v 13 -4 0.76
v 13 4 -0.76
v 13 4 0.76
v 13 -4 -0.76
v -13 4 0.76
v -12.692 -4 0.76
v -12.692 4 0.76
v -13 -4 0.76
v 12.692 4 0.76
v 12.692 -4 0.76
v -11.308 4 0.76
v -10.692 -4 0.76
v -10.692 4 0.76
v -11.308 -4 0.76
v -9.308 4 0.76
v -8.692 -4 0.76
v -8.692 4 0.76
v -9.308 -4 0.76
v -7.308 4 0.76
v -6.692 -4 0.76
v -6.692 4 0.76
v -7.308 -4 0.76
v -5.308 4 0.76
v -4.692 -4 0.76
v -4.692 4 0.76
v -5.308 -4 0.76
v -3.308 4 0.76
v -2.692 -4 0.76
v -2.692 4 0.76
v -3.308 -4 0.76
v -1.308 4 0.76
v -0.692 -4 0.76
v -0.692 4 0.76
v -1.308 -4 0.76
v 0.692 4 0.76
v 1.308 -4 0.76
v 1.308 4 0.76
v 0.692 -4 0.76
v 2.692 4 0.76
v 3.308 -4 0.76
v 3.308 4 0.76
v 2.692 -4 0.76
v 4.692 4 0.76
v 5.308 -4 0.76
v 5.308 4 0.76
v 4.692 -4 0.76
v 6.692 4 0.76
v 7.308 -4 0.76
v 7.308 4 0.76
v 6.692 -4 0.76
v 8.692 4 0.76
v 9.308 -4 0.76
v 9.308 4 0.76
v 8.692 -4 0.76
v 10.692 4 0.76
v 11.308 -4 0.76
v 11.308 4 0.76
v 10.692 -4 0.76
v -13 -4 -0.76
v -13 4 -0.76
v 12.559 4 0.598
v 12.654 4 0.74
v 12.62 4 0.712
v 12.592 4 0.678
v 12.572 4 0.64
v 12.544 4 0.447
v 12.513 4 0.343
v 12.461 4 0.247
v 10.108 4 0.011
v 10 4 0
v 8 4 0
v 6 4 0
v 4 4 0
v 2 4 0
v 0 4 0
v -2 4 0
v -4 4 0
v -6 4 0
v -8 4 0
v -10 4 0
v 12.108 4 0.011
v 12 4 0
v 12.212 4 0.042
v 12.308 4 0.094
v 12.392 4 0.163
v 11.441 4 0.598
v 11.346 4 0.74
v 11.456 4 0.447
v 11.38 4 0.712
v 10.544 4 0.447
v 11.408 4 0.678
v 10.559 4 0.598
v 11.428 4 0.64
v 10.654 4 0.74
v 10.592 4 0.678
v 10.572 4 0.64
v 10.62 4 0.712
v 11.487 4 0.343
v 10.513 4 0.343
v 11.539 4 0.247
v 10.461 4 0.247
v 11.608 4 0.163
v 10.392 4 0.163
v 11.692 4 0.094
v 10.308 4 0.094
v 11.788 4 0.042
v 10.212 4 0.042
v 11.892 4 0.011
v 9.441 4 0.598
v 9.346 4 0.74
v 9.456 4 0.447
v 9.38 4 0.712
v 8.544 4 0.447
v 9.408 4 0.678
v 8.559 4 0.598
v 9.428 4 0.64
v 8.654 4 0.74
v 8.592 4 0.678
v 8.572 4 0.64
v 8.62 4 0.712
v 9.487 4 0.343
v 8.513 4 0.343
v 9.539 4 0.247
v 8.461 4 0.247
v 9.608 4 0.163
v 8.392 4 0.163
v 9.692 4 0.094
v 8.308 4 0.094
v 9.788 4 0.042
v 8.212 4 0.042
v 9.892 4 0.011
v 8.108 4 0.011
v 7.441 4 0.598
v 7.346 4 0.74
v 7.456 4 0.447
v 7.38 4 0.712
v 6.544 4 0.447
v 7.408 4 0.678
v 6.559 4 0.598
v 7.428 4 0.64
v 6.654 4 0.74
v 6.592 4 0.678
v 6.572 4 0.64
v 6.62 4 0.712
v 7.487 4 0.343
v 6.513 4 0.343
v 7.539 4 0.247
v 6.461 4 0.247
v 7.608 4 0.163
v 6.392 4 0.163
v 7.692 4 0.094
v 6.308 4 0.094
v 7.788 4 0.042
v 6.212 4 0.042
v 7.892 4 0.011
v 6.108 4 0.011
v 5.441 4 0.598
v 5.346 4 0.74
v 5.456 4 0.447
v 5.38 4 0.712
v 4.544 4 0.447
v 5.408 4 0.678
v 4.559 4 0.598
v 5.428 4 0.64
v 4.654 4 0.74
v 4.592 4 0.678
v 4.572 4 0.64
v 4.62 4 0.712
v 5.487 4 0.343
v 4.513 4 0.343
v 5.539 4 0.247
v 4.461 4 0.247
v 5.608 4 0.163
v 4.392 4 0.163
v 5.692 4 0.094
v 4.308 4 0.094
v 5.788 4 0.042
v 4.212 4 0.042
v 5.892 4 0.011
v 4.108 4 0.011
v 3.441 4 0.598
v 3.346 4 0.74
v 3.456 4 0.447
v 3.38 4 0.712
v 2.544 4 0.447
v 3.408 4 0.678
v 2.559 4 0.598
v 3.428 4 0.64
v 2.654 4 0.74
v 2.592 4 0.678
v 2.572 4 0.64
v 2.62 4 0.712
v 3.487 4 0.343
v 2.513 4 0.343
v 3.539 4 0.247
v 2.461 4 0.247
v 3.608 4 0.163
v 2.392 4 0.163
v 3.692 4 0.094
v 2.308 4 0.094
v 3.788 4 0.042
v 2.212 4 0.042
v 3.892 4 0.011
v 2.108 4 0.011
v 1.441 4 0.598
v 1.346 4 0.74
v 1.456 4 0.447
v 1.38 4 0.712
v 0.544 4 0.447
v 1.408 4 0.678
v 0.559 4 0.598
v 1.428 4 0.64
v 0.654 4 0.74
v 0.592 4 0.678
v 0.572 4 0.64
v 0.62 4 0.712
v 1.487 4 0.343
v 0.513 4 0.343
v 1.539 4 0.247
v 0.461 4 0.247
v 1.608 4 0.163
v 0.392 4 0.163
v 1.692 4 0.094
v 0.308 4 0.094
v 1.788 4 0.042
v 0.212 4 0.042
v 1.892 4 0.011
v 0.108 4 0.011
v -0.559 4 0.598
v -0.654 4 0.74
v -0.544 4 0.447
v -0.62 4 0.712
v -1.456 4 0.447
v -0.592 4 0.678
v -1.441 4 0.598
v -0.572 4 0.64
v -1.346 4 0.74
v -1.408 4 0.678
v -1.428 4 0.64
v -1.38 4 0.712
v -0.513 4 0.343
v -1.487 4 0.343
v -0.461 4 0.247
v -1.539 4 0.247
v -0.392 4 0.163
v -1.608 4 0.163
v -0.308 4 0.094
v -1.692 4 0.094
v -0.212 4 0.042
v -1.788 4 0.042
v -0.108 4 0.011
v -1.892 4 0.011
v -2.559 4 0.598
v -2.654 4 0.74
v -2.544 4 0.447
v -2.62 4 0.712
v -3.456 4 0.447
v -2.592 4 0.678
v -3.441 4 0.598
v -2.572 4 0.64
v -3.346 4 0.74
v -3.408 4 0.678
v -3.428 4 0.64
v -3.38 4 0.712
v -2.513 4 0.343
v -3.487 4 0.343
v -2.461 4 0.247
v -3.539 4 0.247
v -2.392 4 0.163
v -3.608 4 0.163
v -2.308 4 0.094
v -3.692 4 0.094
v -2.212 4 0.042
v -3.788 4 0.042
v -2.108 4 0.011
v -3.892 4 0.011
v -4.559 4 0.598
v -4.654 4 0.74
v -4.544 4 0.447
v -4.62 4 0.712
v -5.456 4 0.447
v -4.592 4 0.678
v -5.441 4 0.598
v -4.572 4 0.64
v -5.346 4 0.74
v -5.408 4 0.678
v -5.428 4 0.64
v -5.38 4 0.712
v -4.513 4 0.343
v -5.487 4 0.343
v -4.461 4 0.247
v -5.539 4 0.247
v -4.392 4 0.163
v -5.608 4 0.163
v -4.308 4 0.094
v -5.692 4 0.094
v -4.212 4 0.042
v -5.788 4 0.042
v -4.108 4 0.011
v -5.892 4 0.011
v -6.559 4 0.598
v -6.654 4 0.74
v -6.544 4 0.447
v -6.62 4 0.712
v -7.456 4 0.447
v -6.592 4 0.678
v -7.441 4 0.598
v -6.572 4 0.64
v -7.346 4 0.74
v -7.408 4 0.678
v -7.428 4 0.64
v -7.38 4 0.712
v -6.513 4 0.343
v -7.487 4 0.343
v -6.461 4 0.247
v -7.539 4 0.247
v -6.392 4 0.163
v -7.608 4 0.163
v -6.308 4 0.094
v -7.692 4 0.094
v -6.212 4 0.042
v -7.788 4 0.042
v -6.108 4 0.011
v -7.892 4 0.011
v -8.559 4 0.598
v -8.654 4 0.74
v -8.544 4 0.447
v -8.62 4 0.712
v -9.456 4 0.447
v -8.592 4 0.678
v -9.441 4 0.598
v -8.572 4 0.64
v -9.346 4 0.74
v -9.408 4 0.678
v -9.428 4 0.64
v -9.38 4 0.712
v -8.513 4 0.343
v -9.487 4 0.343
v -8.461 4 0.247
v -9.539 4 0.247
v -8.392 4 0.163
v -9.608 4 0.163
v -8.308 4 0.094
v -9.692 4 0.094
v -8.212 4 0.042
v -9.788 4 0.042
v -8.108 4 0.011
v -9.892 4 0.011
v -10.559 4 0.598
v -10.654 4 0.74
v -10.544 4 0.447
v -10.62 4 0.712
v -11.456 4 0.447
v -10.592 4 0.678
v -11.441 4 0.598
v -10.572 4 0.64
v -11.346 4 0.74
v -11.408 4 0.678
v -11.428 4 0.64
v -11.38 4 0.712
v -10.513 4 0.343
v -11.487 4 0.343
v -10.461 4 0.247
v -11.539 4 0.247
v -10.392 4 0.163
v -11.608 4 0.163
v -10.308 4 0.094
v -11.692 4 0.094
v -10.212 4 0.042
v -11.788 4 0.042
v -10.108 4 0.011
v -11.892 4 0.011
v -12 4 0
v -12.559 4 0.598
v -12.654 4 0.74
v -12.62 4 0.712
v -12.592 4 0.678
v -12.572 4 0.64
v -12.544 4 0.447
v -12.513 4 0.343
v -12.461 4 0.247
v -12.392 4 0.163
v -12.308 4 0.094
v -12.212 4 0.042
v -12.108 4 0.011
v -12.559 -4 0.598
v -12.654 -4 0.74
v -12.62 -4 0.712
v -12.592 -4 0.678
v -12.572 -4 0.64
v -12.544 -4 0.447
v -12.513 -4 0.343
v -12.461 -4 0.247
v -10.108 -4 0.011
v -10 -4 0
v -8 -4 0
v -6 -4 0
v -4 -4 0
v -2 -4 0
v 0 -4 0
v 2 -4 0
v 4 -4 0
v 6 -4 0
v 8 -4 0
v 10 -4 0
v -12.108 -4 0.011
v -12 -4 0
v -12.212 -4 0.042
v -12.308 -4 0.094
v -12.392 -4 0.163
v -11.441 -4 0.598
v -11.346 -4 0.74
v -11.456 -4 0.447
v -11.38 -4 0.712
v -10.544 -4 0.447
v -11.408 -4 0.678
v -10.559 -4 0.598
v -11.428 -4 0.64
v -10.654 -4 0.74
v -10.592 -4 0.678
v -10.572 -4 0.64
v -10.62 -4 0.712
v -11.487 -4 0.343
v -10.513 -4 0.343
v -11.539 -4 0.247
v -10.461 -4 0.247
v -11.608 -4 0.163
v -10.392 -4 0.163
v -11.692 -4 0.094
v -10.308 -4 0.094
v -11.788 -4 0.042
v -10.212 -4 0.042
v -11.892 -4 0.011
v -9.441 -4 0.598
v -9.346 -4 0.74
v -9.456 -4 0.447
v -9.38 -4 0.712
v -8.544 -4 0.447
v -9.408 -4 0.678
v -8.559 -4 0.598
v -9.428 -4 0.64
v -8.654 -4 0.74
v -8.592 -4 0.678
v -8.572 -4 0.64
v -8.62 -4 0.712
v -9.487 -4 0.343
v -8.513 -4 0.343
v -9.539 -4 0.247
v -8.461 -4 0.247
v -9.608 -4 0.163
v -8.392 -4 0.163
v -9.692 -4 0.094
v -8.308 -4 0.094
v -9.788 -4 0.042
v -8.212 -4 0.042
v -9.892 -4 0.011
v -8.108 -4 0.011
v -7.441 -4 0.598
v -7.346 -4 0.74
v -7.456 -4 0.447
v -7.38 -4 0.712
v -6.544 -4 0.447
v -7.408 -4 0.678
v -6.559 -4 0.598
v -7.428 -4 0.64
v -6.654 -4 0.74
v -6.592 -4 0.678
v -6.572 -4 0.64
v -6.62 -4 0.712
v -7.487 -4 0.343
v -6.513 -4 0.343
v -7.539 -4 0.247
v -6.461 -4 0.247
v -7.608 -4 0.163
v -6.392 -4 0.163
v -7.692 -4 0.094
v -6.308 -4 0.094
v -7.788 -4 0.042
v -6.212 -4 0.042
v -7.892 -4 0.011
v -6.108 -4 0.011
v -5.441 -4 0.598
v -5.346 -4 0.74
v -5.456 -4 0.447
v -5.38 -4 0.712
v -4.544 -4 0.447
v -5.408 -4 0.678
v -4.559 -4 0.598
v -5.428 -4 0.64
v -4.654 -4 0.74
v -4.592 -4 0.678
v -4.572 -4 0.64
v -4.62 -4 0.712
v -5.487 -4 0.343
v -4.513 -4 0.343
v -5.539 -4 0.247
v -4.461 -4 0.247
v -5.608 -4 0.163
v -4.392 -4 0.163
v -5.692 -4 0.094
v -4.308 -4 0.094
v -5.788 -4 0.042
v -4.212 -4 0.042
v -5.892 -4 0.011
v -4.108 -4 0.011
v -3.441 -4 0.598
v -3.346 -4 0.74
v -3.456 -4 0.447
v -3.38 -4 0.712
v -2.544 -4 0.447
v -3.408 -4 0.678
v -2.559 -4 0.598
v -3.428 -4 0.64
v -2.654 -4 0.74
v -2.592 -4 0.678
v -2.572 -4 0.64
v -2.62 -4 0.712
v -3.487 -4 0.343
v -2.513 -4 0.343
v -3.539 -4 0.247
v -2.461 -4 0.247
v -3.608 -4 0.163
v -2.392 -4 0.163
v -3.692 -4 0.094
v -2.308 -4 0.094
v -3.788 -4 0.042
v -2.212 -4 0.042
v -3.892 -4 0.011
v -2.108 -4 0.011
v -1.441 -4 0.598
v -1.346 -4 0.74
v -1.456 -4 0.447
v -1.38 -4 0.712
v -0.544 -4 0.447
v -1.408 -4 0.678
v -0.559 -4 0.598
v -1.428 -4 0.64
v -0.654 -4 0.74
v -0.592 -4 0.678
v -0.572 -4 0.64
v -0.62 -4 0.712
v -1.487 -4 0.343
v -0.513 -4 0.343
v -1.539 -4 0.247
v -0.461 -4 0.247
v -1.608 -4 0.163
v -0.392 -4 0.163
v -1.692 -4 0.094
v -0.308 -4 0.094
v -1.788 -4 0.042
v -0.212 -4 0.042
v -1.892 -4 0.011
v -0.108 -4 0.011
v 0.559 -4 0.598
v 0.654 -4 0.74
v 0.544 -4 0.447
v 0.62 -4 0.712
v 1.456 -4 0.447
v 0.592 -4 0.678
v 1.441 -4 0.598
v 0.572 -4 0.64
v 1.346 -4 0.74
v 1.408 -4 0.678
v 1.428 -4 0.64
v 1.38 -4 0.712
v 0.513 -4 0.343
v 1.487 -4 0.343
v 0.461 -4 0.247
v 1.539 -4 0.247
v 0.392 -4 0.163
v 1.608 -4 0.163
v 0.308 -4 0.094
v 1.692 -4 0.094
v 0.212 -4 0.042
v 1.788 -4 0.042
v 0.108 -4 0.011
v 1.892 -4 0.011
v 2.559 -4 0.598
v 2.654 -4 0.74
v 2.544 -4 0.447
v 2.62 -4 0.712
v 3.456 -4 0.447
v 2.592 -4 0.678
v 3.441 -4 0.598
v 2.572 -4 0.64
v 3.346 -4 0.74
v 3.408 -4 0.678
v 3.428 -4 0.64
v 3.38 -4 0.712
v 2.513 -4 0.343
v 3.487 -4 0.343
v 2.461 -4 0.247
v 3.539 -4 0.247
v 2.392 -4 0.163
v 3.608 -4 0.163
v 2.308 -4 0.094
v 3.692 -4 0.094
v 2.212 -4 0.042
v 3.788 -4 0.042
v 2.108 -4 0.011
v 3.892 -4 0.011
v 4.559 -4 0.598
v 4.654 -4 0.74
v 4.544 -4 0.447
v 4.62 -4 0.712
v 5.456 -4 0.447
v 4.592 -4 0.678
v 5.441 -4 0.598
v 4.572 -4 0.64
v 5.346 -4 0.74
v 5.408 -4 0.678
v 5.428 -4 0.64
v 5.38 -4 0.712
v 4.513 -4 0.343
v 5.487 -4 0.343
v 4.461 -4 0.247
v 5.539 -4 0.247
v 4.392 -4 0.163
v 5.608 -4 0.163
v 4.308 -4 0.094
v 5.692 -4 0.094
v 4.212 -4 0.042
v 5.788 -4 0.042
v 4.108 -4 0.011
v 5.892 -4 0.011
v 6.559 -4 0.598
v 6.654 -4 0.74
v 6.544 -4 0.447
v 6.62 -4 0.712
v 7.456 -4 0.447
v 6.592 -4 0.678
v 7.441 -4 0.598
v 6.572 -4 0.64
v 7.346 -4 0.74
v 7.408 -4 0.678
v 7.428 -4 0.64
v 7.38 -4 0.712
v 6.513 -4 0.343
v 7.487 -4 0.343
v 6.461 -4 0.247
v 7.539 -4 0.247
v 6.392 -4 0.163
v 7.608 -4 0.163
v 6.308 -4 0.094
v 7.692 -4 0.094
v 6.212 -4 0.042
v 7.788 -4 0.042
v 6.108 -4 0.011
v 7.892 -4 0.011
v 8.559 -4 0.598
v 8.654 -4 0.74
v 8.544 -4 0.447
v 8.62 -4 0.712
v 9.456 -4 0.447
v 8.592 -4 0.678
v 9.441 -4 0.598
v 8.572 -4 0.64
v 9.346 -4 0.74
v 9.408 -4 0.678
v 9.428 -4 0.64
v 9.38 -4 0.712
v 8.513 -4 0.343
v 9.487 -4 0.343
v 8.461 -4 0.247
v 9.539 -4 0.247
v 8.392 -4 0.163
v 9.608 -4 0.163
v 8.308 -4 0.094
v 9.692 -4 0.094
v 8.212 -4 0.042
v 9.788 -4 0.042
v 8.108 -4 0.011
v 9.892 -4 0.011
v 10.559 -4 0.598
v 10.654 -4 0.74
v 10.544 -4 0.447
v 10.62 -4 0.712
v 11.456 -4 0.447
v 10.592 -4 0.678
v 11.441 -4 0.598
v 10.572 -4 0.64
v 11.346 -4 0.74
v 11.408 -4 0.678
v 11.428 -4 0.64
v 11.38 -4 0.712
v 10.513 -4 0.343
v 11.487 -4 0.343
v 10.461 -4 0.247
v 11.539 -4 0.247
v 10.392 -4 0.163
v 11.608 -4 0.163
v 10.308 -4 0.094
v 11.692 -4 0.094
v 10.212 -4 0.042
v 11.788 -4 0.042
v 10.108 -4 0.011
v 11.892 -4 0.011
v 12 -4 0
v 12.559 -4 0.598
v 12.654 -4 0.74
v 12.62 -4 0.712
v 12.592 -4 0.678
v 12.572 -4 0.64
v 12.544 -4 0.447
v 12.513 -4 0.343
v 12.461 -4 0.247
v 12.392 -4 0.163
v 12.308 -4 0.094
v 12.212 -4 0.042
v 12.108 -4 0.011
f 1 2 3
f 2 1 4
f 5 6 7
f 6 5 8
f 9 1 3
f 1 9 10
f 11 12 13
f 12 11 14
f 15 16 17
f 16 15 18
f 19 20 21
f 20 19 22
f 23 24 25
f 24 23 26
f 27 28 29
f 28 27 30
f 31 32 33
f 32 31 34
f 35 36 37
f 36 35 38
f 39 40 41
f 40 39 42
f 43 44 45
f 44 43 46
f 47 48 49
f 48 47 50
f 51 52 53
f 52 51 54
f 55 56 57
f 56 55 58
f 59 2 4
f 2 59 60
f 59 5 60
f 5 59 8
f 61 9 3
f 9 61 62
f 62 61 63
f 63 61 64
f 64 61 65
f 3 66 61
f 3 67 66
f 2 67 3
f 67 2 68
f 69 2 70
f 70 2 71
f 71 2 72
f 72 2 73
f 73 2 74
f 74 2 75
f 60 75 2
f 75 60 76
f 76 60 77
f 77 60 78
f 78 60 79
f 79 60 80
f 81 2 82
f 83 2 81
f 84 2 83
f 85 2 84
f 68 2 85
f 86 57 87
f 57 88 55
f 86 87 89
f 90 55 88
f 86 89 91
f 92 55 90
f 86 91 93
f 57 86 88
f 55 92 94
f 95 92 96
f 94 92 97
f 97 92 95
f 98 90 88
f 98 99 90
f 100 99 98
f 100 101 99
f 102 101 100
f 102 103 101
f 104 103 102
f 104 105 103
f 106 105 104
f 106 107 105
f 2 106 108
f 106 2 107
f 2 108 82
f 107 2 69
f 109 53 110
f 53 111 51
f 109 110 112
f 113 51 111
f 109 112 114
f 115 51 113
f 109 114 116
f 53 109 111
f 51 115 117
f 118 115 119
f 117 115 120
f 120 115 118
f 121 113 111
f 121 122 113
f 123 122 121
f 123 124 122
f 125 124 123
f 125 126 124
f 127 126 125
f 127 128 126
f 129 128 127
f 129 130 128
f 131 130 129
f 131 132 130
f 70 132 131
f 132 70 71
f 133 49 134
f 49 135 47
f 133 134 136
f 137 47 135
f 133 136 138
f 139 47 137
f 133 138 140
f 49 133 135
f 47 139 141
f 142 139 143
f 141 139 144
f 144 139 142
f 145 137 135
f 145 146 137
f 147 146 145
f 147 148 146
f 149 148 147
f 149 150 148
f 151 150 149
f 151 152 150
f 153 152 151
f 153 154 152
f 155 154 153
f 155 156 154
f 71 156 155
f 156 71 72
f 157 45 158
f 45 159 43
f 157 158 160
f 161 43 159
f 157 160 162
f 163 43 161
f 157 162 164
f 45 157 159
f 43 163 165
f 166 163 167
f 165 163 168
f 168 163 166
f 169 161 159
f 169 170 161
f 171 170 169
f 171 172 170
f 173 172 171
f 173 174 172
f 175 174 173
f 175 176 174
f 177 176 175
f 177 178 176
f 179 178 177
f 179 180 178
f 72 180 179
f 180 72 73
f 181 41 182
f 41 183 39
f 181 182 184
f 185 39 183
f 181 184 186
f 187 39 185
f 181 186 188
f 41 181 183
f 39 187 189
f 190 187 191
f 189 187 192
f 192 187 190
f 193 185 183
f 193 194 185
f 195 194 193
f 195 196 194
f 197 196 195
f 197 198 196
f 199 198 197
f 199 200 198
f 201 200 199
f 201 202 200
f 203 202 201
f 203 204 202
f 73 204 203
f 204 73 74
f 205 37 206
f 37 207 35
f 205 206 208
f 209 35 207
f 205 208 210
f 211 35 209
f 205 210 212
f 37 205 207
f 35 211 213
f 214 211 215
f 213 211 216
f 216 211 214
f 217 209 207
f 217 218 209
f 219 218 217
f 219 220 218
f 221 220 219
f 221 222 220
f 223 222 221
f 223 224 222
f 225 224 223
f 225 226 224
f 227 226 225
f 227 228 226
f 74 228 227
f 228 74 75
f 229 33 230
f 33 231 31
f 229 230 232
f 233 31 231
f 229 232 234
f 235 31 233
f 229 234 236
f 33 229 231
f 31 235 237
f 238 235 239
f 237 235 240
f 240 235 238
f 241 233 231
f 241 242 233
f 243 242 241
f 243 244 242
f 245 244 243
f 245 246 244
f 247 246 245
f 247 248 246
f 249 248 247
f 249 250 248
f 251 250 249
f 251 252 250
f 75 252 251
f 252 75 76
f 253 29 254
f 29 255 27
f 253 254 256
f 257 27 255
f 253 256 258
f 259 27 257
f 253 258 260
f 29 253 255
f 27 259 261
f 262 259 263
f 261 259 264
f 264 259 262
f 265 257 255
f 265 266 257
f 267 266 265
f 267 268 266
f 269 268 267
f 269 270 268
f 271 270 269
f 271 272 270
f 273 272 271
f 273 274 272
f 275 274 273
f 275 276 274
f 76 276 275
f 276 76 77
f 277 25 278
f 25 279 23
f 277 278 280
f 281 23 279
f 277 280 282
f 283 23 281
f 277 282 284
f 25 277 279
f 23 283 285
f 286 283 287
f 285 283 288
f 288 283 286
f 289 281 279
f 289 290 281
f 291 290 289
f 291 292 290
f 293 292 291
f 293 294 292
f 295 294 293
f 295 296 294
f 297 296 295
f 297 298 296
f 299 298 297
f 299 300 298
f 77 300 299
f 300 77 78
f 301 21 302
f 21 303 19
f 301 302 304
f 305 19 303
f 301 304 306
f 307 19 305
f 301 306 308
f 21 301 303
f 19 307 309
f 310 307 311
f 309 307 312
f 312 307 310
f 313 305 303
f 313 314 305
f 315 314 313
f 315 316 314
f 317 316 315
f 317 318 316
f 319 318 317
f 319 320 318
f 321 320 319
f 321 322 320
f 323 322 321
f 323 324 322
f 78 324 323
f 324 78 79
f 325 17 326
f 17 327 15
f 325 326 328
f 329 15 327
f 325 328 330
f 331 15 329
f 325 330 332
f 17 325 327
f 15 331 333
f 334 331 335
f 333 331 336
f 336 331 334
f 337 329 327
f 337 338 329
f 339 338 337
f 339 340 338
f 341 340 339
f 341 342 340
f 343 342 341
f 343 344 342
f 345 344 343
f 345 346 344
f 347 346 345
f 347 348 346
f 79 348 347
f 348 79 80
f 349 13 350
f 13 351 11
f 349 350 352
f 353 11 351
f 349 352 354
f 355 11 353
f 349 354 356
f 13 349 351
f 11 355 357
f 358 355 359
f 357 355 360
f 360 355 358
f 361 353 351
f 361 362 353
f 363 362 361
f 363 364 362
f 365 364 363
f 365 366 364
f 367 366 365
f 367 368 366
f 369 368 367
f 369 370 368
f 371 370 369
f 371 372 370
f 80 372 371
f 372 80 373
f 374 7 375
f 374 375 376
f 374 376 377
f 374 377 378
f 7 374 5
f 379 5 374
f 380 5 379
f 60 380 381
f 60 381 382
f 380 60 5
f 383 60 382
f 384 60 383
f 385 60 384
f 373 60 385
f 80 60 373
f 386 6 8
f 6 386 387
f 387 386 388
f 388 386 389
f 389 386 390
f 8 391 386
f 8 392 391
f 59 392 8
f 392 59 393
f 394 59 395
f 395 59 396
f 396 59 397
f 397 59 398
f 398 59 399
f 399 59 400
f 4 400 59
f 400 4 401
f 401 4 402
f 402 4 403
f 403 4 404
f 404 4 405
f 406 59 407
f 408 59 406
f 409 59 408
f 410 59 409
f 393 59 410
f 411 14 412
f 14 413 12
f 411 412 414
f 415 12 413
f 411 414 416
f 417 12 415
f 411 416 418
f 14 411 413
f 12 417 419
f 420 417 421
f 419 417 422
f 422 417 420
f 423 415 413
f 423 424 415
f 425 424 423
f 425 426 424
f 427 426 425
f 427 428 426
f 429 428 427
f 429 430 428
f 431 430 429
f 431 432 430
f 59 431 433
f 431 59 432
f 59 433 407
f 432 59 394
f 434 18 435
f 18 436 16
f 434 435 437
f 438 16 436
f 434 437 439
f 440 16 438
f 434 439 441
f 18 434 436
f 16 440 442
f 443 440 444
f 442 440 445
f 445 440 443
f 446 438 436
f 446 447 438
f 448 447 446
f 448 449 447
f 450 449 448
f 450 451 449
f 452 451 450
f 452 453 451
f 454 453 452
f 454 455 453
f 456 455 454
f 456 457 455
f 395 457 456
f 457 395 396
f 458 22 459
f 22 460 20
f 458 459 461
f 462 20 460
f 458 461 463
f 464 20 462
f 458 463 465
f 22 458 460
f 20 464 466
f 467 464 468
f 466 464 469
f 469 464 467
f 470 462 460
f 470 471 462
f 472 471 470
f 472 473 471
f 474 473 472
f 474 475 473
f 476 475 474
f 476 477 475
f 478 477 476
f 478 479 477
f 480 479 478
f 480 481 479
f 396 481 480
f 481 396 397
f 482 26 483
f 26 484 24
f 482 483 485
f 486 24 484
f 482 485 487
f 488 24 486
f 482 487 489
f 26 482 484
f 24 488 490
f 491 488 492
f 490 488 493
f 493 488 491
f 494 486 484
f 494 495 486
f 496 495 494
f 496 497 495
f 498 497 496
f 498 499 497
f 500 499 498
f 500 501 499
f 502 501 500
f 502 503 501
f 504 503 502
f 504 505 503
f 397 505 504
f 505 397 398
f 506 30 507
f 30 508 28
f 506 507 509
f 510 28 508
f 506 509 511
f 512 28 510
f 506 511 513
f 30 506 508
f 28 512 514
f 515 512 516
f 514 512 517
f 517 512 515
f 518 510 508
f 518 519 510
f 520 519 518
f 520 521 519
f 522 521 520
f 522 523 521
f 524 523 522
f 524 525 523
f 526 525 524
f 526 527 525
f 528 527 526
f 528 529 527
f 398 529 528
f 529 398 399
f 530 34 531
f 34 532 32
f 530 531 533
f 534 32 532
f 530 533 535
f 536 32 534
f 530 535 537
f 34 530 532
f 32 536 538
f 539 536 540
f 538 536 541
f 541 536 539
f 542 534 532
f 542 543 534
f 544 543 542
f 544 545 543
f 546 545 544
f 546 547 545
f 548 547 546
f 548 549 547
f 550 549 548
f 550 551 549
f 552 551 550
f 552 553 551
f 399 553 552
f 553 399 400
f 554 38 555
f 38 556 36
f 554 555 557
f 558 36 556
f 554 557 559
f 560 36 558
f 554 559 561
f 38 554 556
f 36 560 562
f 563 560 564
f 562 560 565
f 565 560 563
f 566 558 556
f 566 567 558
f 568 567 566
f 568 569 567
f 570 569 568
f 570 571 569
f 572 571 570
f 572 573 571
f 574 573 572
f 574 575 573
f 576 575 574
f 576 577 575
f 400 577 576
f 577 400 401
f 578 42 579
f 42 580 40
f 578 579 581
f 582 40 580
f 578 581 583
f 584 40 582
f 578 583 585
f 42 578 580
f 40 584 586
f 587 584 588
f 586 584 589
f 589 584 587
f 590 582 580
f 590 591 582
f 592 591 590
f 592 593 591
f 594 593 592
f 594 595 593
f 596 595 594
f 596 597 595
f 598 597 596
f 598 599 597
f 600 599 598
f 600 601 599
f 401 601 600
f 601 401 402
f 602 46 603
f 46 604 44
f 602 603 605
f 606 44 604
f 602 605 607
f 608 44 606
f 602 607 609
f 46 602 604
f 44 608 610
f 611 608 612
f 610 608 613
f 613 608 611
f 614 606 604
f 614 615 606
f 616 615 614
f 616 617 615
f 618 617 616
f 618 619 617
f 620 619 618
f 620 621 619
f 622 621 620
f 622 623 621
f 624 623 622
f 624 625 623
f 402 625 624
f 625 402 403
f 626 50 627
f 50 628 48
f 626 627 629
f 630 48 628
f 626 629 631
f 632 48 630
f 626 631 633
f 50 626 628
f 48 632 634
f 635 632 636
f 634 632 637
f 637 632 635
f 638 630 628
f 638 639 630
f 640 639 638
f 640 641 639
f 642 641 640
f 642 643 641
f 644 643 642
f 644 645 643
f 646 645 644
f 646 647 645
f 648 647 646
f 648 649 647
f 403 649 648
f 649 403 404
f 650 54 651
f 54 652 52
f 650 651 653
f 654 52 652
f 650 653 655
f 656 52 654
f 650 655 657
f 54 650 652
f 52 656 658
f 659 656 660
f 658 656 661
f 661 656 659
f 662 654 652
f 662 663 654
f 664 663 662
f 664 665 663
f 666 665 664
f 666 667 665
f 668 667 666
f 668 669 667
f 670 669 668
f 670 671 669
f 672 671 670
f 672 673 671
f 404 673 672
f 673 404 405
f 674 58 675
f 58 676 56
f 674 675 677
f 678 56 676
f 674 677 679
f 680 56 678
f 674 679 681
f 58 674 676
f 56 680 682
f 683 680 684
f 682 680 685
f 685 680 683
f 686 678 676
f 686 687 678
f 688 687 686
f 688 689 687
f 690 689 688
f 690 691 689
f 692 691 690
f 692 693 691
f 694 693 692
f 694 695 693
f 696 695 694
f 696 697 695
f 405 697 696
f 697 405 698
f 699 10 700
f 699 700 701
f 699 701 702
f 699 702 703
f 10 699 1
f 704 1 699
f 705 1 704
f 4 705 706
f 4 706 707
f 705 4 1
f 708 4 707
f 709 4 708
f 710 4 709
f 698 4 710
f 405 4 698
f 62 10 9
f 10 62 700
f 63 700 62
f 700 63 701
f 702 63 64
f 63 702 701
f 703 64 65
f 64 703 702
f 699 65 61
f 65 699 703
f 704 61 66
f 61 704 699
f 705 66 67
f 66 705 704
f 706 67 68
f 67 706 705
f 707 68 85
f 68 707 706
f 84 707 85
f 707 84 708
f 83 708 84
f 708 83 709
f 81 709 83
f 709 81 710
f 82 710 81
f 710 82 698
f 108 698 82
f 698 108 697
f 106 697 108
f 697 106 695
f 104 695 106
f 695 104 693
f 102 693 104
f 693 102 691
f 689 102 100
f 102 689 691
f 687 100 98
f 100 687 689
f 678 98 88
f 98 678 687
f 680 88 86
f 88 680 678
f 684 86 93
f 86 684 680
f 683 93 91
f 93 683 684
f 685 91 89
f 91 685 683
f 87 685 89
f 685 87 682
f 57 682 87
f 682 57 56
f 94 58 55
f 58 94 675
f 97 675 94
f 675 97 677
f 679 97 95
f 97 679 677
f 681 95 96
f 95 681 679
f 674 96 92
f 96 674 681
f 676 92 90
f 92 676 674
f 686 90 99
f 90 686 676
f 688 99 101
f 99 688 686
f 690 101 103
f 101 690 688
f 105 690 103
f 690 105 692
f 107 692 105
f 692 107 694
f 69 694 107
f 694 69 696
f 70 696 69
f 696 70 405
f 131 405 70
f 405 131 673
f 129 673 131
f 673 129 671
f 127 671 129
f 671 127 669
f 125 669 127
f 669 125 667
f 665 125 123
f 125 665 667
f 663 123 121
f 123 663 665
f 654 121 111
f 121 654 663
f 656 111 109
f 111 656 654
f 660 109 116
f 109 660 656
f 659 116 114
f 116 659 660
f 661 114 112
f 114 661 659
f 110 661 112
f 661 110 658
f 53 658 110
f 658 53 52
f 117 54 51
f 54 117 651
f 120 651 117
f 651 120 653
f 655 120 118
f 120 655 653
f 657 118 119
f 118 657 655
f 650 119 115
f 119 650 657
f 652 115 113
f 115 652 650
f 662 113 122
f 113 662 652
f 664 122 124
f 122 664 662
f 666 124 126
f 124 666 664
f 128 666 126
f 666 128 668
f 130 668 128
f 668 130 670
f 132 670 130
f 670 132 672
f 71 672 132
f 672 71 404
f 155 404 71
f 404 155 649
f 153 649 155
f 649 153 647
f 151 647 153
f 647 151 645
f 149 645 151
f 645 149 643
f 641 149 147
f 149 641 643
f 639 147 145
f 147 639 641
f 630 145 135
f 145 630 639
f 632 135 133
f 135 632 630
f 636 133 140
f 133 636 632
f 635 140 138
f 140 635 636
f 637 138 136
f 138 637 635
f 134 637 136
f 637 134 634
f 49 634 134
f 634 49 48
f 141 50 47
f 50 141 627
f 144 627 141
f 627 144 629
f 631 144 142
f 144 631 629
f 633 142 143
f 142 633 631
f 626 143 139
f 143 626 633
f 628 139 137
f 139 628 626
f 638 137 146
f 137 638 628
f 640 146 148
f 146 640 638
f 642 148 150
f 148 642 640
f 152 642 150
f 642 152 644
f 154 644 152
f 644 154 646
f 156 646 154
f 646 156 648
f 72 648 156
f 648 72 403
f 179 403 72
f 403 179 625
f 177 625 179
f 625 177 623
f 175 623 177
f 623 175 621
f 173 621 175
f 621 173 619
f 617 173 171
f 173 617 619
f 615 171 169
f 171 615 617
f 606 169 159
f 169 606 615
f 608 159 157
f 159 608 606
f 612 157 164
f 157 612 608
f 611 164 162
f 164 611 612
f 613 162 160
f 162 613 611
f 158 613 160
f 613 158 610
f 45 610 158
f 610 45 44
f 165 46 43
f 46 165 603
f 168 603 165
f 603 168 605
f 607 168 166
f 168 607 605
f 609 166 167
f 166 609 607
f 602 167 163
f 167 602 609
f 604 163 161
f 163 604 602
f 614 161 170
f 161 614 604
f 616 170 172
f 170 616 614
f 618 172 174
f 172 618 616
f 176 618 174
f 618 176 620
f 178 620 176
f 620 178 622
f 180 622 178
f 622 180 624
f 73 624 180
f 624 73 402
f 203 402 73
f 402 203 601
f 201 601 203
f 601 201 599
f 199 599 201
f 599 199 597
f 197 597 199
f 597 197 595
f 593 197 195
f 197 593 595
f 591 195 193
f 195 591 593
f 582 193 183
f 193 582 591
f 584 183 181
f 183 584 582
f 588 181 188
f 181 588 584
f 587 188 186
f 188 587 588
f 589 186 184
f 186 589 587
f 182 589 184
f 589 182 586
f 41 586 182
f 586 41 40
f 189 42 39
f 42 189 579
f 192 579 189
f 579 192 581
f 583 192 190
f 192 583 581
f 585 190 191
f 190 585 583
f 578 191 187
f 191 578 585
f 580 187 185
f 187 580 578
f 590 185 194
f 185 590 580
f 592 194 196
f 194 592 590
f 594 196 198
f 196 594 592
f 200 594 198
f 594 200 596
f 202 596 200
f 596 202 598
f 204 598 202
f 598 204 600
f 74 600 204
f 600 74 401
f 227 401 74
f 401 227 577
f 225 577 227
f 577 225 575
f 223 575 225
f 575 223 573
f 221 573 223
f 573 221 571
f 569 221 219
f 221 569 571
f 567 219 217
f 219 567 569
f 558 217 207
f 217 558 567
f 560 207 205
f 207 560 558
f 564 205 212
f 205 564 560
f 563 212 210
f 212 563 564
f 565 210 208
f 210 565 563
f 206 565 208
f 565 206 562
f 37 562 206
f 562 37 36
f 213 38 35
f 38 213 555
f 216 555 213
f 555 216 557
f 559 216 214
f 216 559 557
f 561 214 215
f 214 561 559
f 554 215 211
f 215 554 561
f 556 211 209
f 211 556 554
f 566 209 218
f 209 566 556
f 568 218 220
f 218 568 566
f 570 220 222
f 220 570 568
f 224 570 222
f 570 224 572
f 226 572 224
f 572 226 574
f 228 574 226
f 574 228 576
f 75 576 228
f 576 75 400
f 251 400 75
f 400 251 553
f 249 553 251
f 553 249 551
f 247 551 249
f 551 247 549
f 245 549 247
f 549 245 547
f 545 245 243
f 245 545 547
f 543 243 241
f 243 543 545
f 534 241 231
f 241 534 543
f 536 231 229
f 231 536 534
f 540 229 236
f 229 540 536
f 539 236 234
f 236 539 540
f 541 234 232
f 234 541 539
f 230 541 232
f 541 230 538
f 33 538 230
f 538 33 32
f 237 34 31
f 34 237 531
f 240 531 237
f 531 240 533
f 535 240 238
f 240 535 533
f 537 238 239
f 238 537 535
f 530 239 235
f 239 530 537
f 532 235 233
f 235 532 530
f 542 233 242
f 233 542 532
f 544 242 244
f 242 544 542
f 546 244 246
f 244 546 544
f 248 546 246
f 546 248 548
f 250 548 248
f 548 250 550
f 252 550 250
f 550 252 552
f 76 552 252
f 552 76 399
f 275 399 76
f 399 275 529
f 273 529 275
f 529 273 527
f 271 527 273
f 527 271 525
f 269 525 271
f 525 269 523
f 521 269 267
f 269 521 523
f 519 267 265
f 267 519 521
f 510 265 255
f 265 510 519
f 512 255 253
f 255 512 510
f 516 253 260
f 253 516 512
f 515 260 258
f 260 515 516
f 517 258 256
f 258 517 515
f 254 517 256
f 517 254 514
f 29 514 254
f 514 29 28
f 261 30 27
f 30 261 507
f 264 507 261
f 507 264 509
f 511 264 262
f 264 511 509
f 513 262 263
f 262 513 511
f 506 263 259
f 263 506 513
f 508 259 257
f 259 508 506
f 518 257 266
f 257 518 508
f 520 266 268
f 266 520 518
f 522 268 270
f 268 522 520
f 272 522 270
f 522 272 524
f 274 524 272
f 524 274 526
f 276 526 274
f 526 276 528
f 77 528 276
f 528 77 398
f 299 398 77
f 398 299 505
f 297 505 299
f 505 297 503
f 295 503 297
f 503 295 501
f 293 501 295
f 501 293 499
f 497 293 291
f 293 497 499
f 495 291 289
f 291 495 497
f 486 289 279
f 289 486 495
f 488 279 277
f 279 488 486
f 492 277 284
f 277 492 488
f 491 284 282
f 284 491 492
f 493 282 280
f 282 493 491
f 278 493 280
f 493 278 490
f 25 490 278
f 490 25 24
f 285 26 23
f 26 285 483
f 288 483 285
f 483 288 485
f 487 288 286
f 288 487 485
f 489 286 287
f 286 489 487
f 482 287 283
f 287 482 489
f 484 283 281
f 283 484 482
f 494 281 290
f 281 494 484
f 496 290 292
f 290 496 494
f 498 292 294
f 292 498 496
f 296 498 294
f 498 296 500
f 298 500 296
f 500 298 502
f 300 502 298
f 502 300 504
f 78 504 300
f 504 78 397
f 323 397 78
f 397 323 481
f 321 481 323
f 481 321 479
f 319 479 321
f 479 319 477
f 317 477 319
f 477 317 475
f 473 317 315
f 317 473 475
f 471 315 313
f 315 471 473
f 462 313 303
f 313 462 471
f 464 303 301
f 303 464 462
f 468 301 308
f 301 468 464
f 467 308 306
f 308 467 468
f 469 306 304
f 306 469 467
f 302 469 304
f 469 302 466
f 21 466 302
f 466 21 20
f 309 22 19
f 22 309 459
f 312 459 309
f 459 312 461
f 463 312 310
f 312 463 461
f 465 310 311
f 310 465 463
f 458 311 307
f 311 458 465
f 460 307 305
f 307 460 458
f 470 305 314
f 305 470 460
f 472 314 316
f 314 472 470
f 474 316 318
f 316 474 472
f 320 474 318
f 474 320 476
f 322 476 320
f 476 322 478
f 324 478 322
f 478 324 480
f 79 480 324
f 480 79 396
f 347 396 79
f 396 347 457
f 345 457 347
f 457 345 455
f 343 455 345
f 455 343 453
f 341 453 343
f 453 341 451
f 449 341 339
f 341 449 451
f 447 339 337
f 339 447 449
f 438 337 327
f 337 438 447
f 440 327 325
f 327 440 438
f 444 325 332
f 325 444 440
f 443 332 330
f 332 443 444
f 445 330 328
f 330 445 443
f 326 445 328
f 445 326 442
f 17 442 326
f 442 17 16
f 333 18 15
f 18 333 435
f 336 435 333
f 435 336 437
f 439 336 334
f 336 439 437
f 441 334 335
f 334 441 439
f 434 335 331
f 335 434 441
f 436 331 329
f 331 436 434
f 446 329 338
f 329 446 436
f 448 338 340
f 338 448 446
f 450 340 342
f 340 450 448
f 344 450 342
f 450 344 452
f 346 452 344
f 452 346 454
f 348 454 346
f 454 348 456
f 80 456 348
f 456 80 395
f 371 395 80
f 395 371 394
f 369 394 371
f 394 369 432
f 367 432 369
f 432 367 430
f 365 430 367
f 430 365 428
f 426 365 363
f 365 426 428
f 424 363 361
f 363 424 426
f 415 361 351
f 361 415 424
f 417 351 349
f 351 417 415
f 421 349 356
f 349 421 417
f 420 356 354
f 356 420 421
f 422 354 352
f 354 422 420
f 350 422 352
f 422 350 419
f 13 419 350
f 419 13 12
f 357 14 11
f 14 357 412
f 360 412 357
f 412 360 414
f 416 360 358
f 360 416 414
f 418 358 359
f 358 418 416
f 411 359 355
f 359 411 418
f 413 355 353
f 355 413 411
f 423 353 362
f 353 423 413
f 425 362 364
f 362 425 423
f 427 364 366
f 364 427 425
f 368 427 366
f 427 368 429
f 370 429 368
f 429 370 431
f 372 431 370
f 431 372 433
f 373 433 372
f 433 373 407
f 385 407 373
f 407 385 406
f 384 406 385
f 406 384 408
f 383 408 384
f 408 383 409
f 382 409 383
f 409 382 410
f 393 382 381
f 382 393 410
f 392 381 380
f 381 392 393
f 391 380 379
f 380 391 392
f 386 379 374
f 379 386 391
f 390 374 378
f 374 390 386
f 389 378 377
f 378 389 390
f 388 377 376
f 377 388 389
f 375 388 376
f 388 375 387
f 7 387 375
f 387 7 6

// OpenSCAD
//
// B E L T
//
// By Sylvain Rochette (sylvain.rochette@gmail.com)
//
// Helper to generate a belt, actually you can generate 
// all types of belt (rounded type) if you know the basic values needed...
//
// Supported Modules:
//
// belt(width, length, pitch, height, teeth_height, radius)
// inverse_belt(width, length, pitch, height, teeth_height, radius)
// gt2_belt(width, length)
// inverse_gt2_belt(width, length)
//

module teeth(width, pitch, radius, inner_radius)
{
    circle(r = radius, $fn = 32);
    
    for (x = [-1, 1])
    {
        translate([x * (radius + inner_radius), 0])
        intersection()
        {
            translate([x * -inner_radius, -inner_radius])
            square([inner_radius * 2, inner_radius * 2], center = true);
            
            difference()
            {
                circle(r = inner_radius + 1, $fn = 32);

                translate([0, 0])
                circle(r = inner_radius, $fn = 32);
            }
        }
    }
}

module belt(width, length, pitch, height, teeth_height, radius)
{
    teeth_count = ceil(length / pitch) - 1;
    
    rotate([90, 0, 0])
    translate([length * -0.5, height * -0.5, 0])
    linear_extrude(height = width, center = true, convexity = 10)
    {
        // Rectangular base
        square([length, height - teeth_height]);
        
        // Teeths
        translate([0, height - radius])
        for (i = [0:teeth_count])
        {
            translate([pitch * 0.5 + i * pitch, 0])
            teeth(
                width = width, 
                pitch = pitch, 
                radius = radius, 
                inner_radius = radius * 0.4,
                teeth_height = teeth_height);
        }
    }
}

module inverse_belt(width, length, pitch, height, teeth_height, radius)
{
    difference()
    {
        translate([length * -0.5, width * -0.5, height * -0.5])
        cube([length, width, height]);
        
        rotate([180, 0, 0])
        translate([0, 0, height * -0.5])
        belt(
            width = width + 1, 
            length = length, 
            pitch = pitch, 
            height = height, 
            teeth_height = teeth_height,
            radius = radius);
    }   
}

module gt2_belt(width, length)
{
    belt(
        width = width, 
        length = length, 
        pitch = 2, 
        height = 1.52, 
        teeth_height = 0.76,
        radius = 0.555);
}

module inverse_gt2_belt(width, length)
{
    inverse_belt(
        width = width, 
        length = length, 
        pitch = 2, 
        height = 1.52, 
        teeth_height = 0.76,
        radius = 0.555);
}

//gt2_belt(5, 30);
inverse_gt2_belt(8, 26);
